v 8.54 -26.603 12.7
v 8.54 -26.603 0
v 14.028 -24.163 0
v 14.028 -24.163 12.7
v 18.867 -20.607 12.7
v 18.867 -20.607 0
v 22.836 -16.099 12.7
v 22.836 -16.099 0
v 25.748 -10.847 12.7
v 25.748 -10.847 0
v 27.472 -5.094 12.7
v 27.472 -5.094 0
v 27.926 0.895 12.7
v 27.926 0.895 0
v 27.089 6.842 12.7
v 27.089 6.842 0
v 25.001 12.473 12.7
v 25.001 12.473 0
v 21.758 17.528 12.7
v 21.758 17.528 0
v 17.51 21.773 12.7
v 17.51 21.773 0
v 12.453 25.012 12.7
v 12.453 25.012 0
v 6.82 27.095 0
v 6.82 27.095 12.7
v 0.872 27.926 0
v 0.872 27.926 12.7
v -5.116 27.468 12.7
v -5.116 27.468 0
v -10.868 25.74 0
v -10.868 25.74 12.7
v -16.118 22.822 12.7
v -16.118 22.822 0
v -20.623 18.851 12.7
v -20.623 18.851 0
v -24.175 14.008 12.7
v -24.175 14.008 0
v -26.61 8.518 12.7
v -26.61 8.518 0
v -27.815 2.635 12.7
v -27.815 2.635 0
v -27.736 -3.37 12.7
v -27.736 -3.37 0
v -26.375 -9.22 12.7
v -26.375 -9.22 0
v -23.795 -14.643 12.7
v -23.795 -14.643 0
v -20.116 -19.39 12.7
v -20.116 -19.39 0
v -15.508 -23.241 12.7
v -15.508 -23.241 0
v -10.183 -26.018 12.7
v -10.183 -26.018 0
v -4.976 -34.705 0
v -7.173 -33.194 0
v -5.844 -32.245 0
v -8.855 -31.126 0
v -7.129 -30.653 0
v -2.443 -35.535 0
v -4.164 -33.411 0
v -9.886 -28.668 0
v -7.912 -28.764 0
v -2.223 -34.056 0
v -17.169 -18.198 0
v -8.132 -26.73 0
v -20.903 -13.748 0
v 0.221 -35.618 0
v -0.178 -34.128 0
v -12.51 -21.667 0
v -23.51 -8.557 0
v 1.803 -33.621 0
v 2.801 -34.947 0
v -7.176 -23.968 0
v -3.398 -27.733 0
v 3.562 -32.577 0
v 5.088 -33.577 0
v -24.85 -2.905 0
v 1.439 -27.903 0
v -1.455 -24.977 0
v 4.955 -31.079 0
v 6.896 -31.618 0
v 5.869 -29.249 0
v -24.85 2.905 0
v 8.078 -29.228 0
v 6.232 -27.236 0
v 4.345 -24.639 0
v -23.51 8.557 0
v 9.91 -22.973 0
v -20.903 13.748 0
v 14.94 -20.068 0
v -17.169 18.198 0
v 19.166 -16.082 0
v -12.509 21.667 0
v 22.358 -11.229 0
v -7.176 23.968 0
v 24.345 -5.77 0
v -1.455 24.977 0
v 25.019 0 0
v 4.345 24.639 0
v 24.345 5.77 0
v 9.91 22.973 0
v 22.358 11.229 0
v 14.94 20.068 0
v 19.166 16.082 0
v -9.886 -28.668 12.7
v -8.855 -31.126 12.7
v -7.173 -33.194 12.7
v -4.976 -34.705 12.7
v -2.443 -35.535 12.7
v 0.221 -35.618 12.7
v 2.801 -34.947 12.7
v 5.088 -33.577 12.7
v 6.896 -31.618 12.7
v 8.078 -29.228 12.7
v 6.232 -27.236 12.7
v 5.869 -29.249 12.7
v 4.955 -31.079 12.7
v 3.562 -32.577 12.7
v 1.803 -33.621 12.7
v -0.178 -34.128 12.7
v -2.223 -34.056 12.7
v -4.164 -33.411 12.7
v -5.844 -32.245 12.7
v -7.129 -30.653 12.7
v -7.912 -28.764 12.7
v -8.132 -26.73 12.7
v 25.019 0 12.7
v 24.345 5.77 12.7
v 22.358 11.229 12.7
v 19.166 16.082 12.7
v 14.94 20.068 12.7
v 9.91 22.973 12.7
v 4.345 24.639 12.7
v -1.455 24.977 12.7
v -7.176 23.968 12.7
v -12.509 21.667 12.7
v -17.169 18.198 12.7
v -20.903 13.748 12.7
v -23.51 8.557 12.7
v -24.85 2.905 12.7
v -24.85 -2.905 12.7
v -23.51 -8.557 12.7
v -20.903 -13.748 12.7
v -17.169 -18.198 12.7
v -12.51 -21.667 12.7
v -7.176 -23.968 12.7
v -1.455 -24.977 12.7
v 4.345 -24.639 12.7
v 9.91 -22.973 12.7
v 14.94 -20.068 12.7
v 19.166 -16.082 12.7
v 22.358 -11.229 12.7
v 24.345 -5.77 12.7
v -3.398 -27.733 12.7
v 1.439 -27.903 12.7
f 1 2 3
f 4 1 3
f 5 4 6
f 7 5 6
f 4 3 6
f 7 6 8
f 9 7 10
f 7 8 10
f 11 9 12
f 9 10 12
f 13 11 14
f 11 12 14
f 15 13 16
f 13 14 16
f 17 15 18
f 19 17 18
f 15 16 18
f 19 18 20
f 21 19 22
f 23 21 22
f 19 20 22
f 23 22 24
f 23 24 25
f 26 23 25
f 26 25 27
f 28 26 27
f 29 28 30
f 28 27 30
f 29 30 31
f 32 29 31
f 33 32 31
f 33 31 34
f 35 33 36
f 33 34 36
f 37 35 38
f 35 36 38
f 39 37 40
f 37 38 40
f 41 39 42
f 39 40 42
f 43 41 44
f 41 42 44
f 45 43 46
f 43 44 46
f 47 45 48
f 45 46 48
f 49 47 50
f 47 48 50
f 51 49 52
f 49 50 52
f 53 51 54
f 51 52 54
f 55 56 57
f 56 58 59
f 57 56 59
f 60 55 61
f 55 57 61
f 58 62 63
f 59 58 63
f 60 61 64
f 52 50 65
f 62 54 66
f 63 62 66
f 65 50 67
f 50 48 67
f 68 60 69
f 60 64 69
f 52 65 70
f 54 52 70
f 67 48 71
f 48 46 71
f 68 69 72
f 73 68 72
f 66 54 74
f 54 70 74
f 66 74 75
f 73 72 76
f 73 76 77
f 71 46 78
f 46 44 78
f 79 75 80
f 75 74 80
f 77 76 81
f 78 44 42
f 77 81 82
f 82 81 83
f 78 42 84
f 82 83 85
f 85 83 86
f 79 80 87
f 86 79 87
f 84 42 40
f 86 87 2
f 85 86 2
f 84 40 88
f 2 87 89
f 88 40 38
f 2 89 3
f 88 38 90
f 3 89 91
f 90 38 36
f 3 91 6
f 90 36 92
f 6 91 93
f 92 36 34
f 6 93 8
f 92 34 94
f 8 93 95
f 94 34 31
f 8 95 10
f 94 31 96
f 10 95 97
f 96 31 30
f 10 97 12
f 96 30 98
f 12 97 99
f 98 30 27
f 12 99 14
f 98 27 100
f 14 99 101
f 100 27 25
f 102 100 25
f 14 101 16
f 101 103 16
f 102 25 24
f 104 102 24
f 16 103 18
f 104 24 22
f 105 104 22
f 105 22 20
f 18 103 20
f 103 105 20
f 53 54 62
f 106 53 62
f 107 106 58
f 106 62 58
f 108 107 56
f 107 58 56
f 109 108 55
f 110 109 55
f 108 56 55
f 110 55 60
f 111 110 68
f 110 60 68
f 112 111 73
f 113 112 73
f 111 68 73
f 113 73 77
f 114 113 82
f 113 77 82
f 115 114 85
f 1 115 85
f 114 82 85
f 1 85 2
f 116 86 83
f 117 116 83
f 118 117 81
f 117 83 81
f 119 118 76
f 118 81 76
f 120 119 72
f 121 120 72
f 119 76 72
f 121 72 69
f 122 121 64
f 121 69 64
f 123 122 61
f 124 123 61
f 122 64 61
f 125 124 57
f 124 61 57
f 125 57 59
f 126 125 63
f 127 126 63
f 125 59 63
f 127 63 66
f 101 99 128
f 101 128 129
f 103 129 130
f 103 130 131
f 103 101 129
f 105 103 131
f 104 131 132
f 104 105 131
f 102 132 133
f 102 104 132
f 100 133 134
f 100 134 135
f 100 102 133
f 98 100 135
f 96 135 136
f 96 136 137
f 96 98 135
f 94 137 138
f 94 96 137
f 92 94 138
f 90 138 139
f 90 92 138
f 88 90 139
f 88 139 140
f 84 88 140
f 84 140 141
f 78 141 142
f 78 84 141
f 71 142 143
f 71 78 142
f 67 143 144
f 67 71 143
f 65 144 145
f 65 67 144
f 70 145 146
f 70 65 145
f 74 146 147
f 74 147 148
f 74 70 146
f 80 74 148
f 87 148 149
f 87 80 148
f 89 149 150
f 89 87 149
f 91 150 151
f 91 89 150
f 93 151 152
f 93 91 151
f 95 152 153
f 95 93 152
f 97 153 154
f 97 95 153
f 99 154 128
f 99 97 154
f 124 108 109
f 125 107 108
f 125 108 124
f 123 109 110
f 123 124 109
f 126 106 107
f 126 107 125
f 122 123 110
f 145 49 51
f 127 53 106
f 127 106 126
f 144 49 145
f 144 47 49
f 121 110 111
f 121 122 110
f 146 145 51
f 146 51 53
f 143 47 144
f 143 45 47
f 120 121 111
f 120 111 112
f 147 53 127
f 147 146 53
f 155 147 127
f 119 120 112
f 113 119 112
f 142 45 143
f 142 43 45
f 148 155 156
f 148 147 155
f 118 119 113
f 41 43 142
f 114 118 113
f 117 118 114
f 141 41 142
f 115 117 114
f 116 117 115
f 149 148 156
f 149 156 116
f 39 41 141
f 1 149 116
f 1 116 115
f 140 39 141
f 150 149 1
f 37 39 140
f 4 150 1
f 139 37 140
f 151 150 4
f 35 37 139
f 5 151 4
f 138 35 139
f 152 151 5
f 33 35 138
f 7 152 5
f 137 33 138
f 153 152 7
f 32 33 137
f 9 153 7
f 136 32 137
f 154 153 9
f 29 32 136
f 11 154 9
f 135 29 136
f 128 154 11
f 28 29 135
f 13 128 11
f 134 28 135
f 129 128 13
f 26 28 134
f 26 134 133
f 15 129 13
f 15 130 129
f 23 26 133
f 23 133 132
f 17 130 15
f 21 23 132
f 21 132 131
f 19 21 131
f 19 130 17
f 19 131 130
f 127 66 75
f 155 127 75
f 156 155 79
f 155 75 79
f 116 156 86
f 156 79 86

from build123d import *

# Parameters (mm, degrees)
SKETCH1_R           = 27.94
SKETCH1_R_2         = 25.019
BOSS_EXTRUDE1_DEPTH = 12.7


with BuildPart() as part:
    # Sketch1 → Boss-Extrude1 (new body)
    with BuildSketch(Plane.XY):
        with BuildLine():
            ThreePointArc((-8.131862647, -26.730439762), (-9.164248984, -26.394320233), (-10.182796999, -26.018344399))
            ThreePointArc((-10.182796999, -26.018344399), (-1.113760176, -35.671945029), (8.539840454, -26.602908206))
            ThreePointArc((8.539840454, -26.602908206), (7.392494358, -26.944287468), (6.231578661, -27.236208021))
            ThreePointArc((6.231578661, -27.236208021), (-1.203026122, -34.165044546), (-8.131862647, -26.730439762))
        make_face()
        Circle(SKETCH1_R)
        Circle(SKETCH1_R_2, mode=Mode.SUBTRACT)
    extrude(amount=BOSS_EXTRUDE1_DEPTH)


solid = part.part
